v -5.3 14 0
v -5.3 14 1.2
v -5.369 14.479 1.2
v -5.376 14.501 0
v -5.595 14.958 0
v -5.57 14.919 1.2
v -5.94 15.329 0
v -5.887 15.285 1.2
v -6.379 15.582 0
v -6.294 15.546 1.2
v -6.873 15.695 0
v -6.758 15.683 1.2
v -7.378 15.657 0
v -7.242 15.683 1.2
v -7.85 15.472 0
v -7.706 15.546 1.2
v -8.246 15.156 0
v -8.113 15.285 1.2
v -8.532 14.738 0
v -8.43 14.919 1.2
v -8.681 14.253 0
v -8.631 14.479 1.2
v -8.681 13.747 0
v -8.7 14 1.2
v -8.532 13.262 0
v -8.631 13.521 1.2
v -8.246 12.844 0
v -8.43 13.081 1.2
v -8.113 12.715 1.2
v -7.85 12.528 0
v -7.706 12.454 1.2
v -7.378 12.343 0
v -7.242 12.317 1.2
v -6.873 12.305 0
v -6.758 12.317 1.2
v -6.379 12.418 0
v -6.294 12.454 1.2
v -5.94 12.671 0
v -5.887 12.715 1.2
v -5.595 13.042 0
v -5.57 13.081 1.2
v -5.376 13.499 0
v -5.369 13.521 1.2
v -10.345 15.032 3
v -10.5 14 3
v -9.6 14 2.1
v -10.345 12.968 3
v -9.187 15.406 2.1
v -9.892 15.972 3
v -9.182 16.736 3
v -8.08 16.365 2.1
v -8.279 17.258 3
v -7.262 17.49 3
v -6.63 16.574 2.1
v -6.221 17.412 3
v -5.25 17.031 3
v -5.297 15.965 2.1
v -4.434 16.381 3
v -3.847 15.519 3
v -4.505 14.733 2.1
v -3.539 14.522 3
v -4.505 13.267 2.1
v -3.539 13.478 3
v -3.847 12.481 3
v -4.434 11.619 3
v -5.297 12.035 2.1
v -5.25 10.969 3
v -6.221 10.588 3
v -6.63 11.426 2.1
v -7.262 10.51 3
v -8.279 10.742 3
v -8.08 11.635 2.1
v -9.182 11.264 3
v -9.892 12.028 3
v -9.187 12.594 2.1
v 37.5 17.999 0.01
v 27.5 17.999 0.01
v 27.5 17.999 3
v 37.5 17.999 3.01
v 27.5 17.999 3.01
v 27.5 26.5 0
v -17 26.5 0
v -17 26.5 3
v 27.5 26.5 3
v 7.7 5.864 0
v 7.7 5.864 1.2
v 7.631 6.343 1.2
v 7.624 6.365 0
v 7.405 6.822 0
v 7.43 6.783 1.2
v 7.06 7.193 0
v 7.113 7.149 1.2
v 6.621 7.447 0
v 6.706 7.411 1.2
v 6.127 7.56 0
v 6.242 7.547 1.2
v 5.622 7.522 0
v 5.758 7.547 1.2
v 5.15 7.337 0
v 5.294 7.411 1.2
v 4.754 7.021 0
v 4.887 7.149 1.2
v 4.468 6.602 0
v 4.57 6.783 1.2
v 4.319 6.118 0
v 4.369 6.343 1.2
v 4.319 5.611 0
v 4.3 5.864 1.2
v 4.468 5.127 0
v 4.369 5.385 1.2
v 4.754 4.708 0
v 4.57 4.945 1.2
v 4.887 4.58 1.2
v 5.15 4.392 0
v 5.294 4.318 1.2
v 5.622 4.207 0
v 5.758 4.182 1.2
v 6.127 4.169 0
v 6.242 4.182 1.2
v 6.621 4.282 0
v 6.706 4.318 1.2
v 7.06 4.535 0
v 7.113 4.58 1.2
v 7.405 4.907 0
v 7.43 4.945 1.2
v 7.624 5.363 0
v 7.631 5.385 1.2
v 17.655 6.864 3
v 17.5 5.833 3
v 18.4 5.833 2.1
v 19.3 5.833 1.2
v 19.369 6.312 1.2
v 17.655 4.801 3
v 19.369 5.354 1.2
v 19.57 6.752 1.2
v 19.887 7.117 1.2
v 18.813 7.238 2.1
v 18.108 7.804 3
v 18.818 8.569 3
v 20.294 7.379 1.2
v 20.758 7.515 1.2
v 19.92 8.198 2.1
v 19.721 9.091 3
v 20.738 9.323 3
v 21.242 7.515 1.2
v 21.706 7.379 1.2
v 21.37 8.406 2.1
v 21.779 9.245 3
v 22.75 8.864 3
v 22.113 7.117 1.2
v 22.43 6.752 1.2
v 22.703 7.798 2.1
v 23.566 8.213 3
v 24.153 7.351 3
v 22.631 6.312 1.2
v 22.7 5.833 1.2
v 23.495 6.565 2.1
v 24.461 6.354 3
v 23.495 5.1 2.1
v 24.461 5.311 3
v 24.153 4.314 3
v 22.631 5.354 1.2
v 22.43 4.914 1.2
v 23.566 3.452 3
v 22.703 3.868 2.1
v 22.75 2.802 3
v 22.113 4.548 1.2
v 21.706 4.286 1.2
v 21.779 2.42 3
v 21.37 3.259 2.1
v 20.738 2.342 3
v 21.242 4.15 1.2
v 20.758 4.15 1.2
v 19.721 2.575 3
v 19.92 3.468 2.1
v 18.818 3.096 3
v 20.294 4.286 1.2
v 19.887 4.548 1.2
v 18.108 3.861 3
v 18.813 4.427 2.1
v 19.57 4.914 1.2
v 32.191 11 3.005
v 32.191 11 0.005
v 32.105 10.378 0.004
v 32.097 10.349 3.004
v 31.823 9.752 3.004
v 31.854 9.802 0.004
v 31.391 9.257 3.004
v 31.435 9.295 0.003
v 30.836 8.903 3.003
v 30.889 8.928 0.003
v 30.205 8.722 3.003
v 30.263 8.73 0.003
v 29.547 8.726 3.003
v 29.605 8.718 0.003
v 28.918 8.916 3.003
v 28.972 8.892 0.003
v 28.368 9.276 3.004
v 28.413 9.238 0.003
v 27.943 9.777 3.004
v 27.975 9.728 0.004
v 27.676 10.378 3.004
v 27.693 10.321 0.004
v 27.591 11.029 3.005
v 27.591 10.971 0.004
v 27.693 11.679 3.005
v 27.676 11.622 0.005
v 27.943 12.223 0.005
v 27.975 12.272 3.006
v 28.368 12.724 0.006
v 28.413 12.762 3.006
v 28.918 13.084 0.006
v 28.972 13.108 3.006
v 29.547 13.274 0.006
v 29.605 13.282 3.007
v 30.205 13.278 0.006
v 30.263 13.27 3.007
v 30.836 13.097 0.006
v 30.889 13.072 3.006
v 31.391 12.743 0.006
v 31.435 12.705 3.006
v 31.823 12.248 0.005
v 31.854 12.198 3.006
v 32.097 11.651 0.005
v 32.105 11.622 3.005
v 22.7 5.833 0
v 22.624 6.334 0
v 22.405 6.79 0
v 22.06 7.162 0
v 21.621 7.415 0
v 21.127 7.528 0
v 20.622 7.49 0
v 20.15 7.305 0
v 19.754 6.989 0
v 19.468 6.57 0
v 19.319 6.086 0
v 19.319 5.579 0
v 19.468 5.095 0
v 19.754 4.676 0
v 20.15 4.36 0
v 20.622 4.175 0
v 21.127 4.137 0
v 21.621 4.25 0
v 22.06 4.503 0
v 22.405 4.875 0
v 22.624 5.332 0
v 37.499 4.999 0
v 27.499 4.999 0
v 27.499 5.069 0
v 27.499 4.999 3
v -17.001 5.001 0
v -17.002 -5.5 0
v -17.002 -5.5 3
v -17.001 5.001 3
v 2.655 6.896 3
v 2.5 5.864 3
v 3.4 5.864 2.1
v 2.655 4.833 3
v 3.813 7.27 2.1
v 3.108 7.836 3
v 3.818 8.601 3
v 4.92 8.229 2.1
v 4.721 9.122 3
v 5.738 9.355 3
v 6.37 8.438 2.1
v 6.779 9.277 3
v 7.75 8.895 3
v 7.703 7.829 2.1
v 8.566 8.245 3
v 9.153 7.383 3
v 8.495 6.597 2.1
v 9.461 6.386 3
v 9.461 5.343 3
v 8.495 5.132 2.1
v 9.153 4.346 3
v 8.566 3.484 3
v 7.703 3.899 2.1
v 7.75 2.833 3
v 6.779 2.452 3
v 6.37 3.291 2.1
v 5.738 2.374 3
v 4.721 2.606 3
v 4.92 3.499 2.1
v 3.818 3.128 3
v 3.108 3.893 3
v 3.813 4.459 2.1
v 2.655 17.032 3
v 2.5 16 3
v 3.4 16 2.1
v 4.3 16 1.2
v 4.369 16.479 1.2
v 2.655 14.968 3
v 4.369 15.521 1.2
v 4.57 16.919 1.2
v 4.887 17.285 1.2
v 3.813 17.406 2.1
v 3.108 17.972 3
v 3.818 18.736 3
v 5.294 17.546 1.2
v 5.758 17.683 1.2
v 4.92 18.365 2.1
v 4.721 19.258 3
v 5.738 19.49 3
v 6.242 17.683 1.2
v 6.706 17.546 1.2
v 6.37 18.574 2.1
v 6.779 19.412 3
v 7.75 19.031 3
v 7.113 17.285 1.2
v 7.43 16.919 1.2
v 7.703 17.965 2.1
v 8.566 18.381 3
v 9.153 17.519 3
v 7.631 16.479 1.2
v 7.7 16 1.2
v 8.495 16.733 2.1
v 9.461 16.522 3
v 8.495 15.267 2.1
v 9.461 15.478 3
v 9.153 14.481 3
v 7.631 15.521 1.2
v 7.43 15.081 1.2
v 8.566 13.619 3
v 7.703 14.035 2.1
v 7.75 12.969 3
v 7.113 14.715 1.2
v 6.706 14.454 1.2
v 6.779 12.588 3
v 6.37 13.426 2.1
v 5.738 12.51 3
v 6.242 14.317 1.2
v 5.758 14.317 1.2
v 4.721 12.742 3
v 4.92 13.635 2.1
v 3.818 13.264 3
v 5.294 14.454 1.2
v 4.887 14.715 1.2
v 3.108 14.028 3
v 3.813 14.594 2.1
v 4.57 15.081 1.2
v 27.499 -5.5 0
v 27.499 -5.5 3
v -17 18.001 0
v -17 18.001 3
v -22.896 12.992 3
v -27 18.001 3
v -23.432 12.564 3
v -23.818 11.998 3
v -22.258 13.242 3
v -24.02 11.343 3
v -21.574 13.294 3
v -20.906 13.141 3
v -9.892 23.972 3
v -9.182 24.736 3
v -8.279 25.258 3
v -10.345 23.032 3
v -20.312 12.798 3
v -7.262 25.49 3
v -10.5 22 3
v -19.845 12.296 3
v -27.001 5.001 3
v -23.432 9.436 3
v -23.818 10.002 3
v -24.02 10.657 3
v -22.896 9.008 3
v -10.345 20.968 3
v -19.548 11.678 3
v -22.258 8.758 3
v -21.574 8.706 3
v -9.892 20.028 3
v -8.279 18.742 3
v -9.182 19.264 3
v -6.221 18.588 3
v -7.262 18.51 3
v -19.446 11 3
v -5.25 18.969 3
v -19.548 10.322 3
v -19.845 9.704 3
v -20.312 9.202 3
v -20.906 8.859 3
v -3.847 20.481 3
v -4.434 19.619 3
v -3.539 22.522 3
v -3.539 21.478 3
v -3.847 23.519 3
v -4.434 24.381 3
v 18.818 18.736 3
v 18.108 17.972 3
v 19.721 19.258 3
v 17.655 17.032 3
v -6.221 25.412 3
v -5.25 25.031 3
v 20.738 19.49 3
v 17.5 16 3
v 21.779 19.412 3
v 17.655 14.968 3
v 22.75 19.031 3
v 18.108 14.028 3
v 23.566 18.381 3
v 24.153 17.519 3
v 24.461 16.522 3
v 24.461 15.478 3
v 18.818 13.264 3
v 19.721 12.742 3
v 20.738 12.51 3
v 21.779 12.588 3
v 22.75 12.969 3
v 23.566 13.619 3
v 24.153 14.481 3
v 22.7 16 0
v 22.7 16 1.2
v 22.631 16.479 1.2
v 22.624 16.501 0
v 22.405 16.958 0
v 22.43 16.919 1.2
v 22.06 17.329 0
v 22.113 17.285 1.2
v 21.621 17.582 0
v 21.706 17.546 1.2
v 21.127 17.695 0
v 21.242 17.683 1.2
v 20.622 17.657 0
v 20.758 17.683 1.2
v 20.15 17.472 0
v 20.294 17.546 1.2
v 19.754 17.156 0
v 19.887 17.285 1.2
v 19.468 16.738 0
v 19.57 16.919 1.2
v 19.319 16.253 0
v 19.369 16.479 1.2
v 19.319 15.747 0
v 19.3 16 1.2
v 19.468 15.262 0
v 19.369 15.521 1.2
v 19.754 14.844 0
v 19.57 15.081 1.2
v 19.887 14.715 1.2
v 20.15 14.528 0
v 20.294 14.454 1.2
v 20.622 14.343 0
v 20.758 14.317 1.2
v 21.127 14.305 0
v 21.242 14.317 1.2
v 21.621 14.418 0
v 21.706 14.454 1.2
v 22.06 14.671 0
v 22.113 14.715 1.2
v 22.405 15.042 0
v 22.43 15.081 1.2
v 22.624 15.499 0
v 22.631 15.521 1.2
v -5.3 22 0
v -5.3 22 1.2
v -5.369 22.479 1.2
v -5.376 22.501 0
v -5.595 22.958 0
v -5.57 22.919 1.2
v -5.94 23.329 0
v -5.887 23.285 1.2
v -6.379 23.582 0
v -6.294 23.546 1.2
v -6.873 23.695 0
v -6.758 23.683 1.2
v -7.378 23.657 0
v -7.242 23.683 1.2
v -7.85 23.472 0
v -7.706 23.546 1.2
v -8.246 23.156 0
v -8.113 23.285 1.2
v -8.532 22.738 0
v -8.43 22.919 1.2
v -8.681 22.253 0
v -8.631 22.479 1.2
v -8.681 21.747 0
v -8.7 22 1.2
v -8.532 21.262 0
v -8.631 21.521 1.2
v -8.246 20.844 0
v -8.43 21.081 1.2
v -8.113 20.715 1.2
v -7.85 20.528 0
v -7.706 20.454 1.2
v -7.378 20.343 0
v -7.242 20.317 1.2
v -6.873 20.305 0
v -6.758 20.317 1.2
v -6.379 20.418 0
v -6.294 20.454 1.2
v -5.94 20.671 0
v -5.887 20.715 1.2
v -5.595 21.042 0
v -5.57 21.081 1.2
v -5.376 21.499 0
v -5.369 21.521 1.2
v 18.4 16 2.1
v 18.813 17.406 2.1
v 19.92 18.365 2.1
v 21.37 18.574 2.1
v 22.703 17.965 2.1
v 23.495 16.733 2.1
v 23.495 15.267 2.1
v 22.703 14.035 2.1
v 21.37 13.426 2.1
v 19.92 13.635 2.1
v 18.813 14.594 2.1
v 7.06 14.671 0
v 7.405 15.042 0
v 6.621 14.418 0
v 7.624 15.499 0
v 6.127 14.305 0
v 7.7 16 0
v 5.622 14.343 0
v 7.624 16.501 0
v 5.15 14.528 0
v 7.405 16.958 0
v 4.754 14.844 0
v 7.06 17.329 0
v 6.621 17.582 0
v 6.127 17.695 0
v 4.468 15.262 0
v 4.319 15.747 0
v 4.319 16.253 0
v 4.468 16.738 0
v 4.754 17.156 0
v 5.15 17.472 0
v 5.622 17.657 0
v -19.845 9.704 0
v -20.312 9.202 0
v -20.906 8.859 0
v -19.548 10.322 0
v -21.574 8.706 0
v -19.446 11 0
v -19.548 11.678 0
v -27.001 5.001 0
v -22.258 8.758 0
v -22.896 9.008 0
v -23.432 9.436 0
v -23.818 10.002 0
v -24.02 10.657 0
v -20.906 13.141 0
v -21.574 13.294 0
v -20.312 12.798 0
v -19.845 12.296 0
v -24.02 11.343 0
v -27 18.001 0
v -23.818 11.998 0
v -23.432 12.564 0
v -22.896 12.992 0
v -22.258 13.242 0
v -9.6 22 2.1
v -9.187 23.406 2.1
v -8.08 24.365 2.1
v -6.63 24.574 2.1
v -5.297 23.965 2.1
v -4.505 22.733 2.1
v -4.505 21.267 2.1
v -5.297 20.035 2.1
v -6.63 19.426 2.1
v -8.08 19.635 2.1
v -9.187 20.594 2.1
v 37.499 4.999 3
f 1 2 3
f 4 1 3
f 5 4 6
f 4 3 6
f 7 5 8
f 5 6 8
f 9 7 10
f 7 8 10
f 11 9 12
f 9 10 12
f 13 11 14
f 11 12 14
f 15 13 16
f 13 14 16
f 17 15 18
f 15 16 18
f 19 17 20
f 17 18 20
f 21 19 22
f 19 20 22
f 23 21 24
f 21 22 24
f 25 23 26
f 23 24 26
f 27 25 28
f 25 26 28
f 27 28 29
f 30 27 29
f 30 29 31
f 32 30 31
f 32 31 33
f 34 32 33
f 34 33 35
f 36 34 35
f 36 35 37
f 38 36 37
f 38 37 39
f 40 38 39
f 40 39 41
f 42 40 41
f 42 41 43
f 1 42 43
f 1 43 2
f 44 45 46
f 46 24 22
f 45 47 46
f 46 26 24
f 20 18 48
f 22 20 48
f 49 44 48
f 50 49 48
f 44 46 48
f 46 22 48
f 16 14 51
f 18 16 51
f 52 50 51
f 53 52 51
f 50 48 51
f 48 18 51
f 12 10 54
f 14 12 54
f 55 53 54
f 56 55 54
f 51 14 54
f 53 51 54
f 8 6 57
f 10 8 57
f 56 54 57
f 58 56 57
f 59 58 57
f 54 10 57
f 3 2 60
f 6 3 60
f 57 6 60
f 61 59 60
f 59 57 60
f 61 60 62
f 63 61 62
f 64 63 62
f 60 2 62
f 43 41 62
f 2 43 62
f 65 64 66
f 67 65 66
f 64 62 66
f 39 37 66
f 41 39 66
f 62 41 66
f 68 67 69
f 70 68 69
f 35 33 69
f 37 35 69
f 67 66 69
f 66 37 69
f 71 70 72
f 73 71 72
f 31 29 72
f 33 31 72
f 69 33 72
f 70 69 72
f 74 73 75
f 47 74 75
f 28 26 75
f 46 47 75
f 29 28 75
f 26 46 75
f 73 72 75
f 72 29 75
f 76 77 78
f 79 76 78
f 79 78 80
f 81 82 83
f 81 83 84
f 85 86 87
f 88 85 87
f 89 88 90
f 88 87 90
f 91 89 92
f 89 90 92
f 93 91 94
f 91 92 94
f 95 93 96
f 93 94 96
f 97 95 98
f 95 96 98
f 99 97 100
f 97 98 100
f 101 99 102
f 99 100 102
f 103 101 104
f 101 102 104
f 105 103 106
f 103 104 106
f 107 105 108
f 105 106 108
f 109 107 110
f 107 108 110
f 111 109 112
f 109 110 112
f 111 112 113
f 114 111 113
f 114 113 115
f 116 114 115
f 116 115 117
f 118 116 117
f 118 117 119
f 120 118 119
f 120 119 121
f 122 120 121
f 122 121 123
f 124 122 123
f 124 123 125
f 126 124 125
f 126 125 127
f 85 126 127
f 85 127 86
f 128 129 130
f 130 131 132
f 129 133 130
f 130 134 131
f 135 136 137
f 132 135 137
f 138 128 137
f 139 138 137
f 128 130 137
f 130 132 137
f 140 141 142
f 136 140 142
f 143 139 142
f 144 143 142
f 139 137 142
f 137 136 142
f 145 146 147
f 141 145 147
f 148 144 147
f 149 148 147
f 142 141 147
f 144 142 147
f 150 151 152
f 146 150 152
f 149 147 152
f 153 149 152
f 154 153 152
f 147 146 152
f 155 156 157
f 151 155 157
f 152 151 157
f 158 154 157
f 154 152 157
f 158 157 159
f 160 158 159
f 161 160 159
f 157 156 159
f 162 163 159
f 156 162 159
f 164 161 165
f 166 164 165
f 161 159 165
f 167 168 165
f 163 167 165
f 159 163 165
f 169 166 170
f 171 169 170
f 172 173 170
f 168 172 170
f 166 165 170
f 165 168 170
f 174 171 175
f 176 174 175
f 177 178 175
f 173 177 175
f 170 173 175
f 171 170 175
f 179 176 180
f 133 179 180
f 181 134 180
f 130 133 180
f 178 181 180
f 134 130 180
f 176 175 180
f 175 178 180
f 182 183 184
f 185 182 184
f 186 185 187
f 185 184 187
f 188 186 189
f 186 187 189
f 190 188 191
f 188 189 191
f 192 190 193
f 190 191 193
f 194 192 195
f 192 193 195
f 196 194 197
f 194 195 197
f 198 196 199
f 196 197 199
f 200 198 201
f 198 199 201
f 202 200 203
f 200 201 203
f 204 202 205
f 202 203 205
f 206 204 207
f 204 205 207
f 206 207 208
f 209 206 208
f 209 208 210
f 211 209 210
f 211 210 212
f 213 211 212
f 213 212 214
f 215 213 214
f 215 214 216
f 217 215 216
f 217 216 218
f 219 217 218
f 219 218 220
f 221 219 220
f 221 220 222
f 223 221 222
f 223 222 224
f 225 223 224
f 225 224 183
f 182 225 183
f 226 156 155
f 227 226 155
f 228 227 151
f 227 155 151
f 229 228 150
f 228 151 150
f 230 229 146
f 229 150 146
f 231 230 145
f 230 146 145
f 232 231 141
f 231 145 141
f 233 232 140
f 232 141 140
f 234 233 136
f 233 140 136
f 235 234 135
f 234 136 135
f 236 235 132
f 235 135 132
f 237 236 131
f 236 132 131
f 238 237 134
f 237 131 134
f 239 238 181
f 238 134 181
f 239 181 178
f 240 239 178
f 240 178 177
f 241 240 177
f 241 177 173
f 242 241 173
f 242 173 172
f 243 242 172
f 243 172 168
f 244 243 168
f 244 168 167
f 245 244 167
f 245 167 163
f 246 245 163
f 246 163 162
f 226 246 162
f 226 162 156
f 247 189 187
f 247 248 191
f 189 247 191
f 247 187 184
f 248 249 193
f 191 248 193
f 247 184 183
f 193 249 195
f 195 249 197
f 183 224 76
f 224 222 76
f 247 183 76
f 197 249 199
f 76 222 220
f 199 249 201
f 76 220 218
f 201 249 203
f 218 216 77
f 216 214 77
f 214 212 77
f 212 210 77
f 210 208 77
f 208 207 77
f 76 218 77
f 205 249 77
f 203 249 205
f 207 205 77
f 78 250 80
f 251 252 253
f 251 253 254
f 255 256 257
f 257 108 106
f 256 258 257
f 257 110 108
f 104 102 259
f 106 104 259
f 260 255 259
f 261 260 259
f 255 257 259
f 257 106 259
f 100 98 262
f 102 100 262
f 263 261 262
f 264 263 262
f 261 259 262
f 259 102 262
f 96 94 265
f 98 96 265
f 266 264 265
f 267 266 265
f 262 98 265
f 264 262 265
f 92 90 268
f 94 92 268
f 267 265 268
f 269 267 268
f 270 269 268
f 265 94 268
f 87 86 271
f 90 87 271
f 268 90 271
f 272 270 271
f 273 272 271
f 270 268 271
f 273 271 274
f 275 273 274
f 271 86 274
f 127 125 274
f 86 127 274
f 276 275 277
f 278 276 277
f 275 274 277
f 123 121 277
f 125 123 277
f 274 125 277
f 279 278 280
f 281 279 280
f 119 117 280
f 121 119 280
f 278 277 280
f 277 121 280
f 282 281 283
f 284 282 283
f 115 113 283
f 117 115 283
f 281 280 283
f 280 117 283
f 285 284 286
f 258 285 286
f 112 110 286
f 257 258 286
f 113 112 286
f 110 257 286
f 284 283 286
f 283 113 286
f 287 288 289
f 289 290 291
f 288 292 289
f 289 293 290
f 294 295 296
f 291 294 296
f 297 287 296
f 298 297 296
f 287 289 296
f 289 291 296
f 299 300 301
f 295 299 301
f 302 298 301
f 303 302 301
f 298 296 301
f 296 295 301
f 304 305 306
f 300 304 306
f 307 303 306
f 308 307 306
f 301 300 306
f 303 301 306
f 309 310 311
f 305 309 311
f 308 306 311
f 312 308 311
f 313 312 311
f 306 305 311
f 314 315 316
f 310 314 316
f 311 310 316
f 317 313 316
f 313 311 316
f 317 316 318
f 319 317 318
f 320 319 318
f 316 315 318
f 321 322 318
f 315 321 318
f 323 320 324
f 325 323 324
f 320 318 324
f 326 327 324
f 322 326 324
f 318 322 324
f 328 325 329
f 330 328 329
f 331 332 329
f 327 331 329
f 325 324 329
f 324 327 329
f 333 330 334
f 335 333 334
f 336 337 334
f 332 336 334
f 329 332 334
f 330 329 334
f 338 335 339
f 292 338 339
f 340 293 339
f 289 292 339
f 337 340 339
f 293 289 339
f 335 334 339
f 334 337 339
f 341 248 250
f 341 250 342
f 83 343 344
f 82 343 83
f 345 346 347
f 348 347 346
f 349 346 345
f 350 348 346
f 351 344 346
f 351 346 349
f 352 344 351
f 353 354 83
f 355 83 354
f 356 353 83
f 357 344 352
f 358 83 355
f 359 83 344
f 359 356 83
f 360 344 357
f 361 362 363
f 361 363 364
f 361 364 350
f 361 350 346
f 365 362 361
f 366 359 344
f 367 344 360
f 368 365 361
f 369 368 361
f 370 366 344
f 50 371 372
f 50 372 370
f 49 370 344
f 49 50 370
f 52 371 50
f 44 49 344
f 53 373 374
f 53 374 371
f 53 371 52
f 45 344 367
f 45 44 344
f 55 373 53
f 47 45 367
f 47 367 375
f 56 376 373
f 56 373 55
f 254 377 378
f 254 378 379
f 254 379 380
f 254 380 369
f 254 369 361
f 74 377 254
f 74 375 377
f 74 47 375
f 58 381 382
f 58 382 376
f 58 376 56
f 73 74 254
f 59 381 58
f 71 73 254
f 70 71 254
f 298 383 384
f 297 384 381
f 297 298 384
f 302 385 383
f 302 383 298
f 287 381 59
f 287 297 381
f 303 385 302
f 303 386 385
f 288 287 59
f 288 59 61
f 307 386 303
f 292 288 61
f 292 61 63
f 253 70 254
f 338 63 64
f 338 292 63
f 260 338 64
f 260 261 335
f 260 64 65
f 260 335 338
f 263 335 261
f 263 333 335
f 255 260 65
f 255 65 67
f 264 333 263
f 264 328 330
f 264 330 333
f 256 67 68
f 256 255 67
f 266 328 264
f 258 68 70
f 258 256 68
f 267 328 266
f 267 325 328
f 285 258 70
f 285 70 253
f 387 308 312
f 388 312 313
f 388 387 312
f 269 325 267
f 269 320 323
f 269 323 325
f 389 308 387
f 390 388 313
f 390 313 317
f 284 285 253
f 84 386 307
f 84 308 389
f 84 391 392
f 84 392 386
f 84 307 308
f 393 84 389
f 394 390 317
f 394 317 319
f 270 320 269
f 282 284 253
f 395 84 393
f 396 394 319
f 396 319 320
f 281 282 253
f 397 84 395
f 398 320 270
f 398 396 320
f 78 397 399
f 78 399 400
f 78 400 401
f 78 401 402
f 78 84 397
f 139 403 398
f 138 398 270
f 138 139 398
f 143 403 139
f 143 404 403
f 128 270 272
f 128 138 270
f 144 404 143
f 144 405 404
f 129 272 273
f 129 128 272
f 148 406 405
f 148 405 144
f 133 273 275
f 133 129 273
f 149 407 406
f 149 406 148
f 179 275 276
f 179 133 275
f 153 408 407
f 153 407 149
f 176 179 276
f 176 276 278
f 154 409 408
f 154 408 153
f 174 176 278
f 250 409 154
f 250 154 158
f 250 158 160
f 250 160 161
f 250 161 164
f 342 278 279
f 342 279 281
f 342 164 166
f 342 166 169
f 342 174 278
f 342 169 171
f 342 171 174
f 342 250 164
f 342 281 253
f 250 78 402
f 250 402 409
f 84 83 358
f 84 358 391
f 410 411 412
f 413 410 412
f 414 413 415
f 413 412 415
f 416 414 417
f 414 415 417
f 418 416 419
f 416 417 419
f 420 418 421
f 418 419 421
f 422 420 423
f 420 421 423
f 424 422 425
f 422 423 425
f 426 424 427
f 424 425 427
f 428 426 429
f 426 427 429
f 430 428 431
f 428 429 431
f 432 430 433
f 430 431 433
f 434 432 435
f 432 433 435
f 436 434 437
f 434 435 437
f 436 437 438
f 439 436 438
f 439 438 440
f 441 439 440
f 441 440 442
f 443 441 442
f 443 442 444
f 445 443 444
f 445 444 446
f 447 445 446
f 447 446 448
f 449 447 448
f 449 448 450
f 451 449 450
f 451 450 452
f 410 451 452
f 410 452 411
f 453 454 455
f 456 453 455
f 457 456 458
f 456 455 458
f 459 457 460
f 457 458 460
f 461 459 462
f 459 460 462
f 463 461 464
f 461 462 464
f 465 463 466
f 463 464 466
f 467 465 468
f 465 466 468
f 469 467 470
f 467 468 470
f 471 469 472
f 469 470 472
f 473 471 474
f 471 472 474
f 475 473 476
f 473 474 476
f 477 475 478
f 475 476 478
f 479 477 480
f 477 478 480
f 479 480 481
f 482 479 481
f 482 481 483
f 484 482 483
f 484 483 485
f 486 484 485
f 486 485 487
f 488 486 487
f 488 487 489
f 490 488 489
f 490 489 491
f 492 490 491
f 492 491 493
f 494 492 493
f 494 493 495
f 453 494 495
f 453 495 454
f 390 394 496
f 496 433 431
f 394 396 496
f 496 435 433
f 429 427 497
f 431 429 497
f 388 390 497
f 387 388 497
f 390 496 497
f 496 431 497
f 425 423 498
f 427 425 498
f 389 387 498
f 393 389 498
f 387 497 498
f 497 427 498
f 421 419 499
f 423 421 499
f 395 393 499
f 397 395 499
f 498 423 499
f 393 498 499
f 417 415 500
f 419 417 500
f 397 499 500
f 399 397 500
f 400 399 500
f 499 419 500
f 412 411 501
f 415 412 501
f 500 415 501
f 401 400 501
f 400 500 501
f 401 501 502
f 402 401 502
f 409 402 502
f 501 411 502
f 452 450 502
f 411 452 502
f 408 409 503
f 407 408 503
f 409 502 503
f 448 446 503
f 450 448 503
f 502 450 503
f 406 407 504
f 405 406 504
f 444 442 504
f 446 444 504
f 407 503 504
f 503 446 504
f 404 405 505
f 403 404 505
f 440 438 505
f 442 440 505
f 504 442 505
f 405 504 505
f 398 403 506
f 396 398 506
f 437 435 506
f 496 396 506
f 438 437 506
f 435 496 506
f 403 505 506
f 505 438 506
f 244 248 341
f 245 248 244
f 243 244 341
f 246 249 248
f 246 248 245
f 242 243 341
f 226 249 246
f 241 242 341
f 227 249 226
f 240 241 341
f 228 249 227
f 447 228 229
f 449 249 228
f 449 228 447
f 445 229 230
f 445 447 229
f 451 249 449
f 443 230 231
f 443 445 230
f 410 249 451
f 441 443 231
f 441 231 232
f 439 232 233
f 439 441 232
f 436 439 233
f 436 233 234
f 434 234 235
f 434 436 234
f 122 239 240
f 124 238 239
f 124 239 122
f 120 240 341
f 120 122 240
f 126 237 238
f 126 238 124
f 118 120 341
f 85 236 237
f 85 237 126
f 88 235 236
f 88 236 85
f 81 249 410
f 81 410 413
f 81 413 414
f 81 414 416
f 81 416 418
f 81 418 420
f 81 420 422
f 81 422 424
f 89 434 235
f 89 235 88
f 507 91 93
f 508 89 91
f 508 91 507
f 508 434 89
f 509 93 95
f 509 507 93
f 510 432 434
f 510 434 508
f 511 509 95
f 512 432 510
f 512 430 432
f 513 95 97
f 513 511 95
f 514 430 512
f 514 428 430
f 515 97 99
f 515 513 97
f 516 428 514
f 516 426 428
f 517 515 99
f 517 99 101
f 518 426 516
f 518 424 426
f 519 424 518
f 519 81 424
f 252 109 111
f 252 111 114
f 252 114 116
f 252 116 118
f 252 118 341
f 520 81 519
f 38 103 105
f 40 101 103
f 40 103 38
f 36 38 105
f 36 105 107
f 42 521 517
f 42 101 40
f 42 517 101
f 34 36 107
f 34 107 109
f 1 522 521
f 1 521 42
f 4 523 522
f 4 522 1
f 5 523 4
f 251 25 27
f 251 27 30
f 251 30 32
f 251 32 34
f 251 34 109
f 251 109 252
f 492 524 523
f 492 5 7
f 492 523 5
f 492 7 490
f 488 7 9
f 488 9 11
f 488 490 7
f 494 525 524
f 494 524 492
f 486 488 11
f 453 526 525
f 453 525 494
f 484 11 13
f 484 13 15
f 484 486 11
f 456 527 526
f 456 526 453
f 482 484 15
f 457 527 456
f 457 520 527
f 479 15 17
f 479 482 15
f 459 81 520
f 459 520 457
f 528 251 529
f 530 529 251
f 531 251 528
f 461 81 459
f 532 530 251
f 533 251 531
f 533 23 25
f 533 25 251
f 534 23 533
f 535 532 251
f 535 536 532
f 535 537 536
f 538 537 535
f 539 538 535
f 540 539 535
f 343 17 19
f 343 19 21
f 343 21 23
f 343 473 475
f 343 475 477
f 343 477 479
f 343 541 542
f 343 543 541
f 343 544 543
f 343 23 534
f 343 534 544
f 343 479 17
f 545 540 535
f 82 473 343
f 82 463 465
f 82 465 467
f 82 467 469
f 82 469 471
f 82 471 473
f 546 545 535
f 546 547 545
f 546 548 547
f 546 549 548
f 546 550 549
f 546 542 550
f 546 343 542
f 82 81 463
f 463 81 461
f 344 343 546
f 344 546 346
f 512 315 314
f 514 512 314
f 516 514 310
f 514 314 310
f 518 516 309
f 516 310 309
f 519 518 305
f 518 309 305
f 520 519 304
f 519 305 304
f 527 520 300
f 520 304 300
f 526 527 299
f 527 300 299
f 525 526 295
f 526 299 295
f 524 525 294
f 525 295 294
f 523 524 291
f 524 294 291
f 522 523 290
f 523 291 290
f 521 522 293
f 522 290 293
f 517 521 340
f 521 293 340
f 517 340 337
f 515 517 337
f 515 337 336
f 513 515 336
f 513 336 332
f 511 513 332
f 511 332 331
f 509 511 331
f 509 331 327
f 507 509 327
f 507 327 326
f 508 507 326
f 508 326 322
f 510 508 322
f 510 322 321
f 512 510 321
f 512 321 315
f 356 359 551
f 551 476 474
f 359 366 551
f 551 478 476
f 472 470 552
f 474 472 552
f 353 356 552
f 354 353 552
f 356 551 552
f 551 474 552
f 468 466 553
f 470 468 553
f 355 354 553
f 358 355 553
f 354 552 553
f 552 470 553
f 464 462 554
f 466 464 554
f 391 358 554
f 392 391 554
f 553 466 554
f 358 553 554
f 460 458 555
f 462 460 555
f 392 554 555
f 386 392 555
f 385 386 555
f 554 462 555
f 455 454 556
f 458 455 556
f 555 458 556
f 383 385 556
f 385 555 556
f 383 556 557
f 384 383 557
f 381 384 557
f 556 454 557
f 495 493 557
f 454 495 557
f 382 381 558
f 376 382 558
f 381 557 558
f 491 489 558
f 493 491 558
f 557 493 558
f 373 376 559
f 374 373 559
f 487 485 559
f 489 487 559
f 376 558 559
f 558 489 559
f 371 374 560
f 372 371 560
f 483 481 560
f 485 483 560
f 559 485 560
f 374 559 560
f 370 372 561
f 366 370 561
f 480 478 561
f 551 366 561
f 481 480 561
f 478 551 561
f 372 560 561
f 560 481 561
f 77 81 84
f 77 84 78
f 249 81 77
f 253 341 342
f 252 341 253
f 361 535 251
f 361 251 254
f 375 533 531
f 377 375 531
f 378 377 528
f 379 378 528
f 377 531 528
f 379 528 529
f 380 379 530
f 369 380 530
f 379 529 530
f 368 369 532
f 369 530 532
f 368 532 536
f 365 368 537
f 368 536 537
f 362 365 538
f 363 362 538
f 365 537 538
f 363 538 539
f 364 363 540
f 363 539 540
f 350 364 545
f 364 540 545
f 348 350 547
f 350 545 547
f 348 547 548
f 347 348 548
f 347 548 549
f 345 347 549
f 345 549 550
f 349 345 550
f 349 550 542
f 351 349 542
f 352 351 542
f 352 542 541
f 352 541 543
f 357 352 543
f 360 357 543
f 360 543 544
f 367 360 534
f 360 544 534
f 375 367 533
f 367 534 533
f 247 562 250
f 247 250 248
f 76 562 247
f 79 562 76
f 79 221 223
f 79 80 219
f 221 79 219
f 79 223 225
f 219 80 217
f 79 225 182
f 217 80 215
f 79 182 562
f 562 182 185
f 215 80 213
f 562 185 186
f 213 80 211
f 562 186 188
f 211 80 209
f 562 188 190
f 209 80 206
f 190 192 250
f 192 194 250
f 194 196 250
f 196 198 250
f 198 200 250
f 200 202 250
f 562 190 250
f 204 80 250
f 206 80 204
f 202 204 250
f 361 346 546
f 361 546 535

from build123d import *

# Parameters (mm, degrees)
PAD_DEPTH        = 3
SKETCH001_R      = 1.7
POCKET_DEPTH     = 3
SKETCH002_W      = 13
SKETCH002_H      = 3
PAD001_DEPTH     = 10
PAD002_DEPTH     = 10
SKETCH011_R      = 2.3
POCKET003_DEPTH  = 3
POCKET004_DEPTH  = 4
HOLE_D           = 1.75
HOLE_DEPTH       = 25
HOLE_CSINK_D     = 7
HOLE_CSINK_ANGLE = 90


with BuildPart() as part:
    # Sketch → Pad (new body)
    with BuildSketch(Plane.XY):
        Polygon((-17, 26.5), (27.5, 26.5), (27.499024, -5.5), (-17.001501, -5.5), align=None)
    extrude(amount=PAD_DEPTH)

    # Sketch001 (on Face6 of Pad) → Pocket (cut)
    with BuildSketch(Plane.XY.offset(3)):
        with Locations((-7, 22)):
            Circle(SKETCH001_R)
        with Locations((-7, 14)):
            Circle(SKETCH001_R)
        with Locations((6, 16)):
            Circle(SKETCH001_R)
        with Locations((21, 16)):
            Circle(SKETCH001_R)
        with Locations((6, 5.864343)):
            Circle(SKETCH001_R)
        with Locations((20.999966, 5.832606)):
            Circle(SKETCH001_R)
    extrude(amount=-POCKET_DEPTH, mode=Mode.SUBTRACT)

    # Sketch002 (on Face2 of Pocket) → Pad001 (join)
    with BuildSketch(Plane(origin=(-17.001243, 0.000797, 0), x_dir=(-4.7e-05, -1, 0), z_dir=(-1, 4.7e-05, 0))):
        with Locations((-11.5, 1.5)):
            Rectangle(SKETCH002_W, SKETCH002_H)
    extrude(amount=PAD001_DEPTH)

    # Sketch003 (on Face3 of Pad001) → Pad002 (join)
    with BuildSketch(Plane(origin=(27.499192, -0.000839, 0), x_dir=(3e-05, 1, 0), z_dir=(1, -3e-05, 0))):
        Polygon((5, -5.3e-05), (18, 0.009854), (18, 3.010224), (5, 3.000316), align=None)
    extrude(amount=PAD002_DEPTH)

    # Sketch011 (on Face10 of Pad002) → Pocket003 (cut)
    with BuildSketch(Plane(origin=(0, 0, 0), x_dir=(1, 0, 0), z_dir=(0, 0, -1))):
        with Locations((-21.745842, -11)):
            Circle(SKETCH011_R)
        with Locations((29.89052, -11)):
            Circle(SKETCH011_R)
    extrude(amount=-POCKET003_DEPTH, mode=Mode.SUBTRACT)

    # Sketch011 (on Face10 of Pad002) → Pocket004 (cut)
    with BuildSketch(Plane(origin=(0, 0, 0), x_dir=(1, 0, 0), z_dir=(0, 0, -1))):
        with Locations((-21.745842, -11)):
            Circle(SKETCH011_R)
        with Locations((29.89052, -11)):
            Circle(SKETCH011_R)
    extrude(amount=-POCKET004_DEPTH, mode=Mode.SUBTRACT)

    # Hole
    with Locations(Plane.XY.offset(3)):
        with Locations((-7, 22), (-7, 14), (6, 16), (21, 16), (6, 5.864343), (20.999966, 5.832606)):
            CounterSinkHole(HOLE_D / 2, HOLE_CSINK_D / 2, depth=HOLE_DEPTH, counter_sink_angle=HOLE_CSINK_ANGLE)


solid = part.part
